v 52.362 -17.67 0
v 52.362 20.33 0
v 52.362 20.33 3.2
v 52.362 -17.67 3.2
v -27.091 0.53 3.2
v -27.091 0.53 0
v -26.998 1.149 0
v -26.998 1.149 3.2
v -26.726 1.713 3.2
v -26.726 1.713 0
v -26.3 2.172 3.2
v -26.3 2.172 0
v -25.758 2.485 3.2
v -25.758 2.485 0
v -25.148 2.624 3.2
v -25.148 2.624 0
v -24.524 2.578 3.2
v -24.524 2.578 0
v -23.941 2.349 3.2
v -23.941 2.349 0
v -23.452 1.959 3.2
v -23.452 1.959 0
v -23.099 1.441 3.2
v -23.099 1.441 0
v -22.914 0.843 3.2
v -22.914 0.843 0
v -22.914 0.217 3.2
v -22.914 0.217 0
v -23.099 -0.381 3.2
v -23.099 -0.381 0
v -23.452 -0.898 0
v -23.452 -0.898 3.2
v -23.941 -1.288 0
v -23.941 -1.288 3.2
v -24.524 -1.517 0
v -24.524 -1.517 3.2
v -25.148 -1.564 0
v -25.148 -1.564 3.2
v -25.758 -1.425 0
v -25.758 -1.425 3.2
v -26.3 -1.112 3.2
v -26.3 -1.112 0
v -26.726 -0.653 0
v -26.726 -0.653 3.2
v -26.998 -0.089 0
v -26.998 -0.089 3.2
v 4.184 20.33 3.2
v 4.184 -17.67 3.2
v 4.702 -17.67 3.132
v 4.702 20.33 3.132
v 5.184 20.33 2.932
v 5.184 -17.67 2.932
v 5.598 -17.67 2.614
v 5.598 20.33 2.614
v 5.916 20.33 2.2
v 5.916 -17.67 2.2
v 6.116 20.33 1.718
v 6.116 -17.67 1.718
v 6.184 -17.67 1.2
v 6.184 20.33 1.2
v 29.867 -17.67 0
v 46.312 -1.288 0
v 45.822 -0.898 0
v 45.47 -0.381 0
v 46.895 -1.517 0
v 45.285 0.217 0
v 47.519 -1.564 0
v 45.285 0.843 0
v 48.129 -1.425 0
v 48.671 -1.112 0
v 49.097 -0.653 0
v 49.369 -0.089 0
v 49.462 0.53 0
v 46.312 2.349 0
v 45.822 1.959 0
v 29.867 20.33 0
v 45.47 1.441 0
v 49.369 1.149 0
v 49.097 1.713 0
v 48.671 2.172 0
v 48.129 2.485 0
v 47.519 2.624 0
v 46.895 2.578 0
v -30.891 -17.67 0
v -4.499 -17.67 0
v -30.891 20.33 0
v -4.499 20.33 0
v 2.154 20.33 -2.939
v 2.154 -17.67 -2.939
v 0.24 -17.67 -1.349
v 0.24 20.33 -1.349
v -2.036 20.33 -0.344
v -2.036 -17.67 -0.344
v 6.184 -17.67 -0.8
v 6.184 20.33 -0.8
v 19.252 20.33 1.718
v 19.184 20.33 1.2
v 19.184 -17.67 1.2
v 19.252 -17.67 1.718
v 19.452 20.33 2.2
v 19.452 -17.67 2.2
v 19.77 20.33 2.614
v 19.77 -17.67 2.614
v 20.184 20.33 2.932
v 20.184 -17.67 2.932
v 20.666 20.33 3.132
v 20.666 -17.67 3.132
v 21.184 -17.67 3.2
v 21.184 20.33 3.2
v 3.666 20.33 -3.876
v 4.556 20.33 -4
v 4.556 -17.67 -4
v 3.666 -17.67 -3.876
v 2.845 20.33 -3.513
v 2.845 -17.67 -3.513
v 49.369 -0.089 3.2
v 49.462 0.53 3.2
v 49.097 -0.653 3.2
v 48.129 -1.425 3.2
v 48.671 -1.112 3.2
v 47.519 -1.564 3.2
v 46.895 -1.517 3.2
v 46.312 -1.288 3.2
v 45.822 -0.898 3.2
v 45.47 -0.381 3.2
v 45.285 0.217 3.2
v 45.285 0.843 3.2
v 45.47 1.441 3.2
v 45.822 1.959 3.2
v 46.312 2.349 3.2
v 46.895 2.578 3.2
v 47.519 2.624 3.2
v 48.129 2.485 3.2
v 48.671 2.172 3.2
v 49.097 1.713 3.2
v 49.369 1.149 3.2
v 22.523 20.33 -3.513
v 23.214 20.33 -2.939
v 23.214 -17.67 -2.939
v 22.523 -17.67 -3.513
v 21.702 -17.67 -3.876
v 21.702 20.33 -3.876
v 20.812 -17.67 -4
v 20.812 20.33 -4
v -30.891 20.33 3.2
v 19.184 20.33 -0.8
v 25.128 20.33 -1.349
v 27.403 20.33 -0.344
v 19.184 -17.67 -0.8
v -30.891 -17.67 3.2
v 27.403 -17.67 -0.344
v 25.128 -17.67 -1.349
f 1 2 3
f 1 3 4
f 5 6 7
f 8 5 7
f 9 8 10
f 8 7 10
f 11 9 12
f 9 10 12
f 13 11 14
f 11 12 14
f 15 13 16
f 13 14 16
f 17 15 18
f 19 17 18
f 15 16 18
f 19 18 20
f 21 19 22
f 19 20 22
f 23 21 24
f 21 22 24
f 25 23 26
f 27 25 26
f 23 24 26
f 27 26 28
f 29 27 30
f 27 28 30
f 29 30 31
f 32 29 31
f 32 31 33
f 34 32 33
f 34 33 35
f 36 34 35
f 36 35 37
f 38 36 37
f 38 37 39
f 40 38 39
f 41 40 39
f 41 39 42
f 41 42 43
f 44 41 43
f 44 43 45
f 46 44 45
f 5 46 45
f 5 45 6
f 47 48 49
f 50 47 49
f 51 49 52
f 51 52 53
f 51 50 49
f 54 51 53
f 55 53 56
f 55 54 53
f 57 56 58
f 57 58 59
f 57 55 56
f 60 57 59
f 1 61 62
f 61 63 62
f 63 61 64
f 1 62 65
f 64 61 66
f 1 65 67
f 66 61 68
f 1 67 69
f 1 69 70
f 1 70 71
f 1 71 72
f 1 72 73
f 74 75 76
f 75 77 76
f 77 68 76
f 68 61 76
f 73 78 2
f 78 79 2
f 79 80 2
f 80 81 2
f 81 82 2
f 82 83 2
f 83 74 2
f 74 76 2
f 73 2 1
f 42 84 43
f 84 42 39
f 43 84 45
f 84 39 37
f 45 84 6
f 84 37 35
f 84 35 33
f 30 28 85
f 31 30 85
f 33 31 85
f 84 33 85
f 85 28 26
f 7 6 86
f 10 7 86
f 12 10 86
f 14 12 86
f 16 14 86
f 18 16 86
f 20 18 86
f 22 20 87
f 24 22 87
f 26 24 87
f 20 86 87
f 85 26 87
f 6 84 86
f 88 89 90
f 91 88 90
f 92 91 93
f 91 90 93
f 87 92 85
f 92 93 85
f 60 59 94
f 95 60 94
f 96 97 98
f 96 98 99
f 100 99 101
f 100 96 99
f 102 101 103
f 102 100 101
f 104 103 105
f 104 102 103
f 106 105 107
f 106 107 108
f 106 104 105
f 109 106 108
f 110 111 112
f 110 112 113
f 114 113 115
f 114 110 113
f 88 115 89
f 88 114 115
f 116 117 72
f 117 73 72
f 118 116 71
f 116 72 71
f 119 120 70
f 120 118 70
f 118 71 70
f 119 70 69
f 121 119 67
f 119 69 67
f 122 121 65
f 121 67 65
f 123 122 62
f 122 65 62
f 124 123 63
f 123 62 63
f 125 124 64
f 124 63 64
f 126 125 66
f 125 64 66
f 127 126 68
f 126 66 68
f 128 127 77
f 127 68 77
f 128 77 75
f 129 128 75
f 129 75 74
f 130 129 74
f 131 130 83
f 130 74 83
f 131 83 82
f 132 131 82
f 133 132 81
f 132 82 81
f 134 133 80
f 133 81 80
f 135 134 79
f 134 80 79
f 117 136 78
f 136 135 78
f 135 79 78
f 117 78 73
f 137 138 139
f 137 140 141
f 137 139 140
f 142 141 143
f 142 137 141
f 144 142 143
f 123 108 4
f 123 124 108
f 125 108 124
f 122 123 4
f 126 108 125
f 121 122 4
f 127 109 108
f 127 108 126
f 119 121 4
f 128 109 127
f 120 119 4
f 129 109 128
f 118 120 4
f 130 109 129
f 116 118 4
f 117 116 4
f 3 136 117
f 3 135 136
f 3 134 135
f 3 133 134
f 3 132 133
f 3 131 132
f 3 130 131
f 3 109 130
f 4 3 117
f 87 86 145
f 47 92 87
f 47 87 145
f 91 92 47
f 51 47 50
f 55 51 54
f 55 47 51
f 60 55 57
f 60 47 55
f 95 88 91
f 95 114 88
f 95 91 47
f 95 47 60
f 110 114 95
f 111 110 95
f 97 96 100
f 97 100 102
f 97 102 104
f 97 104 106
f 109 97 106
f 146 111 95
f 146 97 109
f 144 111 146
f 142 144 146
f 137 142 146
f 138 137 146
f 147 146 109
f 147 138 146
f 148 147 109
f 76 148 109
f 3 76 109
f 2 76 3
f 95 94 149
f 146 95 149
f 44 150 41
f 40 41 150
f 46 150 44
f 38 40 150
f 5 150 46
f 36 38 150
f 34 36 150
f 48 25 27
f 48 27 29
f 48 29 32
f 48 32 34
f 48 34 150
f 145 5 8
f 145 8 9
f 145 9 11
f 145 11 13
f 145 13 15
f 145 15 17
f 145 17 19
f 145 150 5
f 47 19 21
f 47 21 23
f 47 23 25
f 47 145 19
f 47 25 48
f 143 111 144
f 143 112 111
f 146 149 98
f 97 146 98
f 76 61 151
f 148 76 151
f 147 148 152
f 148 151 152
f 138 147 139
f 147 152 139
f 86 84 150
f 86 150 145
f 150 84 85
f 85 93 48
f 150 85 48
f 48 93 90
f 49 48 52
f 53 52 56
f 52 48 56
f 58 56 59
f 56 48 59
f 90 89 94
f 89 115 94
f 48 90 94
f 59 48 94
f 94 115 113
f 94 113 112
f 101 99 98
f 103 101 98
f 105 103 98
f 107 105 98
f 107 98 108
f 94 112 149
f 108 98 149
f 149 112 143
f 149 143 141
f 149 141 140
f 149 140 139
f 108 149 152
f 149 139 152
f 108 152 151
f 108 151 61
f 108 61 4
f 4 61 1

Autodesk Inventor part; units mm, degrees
ref_plane "YZ Plane" through (0, 0, 0) normal (1, 0, 0) x (0, 1, 0)
ref_plane "XZ Plane" through (0, 0, 0) normal (0, 1, 0) x (-1, 0, 0)
ref_plane "XY Plane" through (0, 0, 0) normal (0, 0, 1) x (1, 0, 0)
sketch "Эскиз1" plane through (0, 0, 0) normal (0, 0, 1) x (1, 0, 0)
  line L0 (-52.8161, -17.6697) -> (52.3618, -17.6697)
  line L1 (-52.8161, 20.3303) -> (52.3618, 20.3303)
  line L2 (52.3618, 20.3303) -> (52.3618, -17.6697)
  line L3 (52.3618, -17.6697) -> (-52.8161, -17.6697)
  line L4 (-52.8161, -17.6697) -> (-52.8161, 20.3303)
  circle A0 centre (-47.8161, 0.5303) radius 2.1
  circle A1 centre (47.3618, 0.5303) radius 2.1
  point P0 (0, 0)
  point P1 (-8.6177, 20.3303)
extrude "Выдавливание1" add sketch "Эскиз1" along normal blind 3.2
sketch "Эскиз2" plane through (-52.8161, -17.6697, 0) normal (0, -1, 0) x (1, 0, 0)
  line L0 (105.1779, 3.2) -> (0, 3.2) projected
  line L1 (105.1779, 0) -> (0, 0) projected
  line L2 (72, 3.2) -> (59, 3.2)
  line L3 (59, 3.2) -> (59, 0)
  line L4 (59, 0) -> (72, 0)
  line L5 (72, 3.2) -> (59, 3.2)
  line L6 (59, 3.2) -> (59, -0.8)
  line L7 (59, -0.8) -> (72, -0.8)
  line L8 (72, -0.8) -> (72, 3.2)
  point P0 (52.8161, 0)
  dimension "d5" = 4
extrude "Выдавливание2" cut sketch "Эскиз2" against normal through all
fillet "Сопряжение1" radius 2 1 edges at (6.1839, 1.3303, 3.2)
sketch "Эскиз3" plane through (-52.8161, -17.6697, 0) normal (0, -1, 0) x (1, 0, 0)
  line L0 (105.1779, 3.2) -> (72, 3.2) projected
  line L1 (72, 3.2) -> (59, 3.2)
  line L2 (59, 3.2) -> (59, -0.8)
  line L3 (59, -0.8) -> (72, -0.8)
  line L4 (72, -0.8) -> (72, 3.2)
  line L5 (72, -0.8) -> (59, -0.8)
  line L6 (59, -0.8) -> (59, -4)
  line L7 (59, -4) -> (72, -4)
  line L8 (72, -4) -> (72, -0.8)
  line L9 (72, 0) -> (105.1779, 0) projected
  line L10 (72, -4) -> (75.2, -4)
  line L11 (75.2, -4) -> (75.2, 0)
  line L12 (75.2, 0) -> (72, 0)
  line L13 (72, 0) -> (72, -4)
  line L14 (59, -4) -> (55.8, -4)
  line L15 (55.8, -4) -> (55.8, 0)
  line L16 (55.8, 0) -> (59, 0)
  line L17 (59, 0) -> (59, -4)
  point P0 (52.8161, 0)
  dimension "d6" = 13
  dimension "d7" = 4
  dimension "d8" = 13
  dimension "d9" = 3.2
  dimension "d10" = 3.2
  dimension "d11" = 3.2
extrude "Выдавливание3" add sketch "Эскиз3" against normal up to surface (38 mm away) contours L9 L11 L10 L8 L4 | L2 L6 L14 L15 L16 | L8 L7 L6 L3
fillet "Сопряжение2" radius 2 1 edges at (19.1839, 1.3303, 3.2)
fillet "Сопряжение3" radius 9 2 edges at (22.3839, 1.3303, 0) (2.9839, 1.3303, 0)
fillet "Сопряжение4" radius 3.25 2 edges at (2.9839, 1.3303, -4) (22.3839, 1.3303, -4)
sketch "Эскиз4" plane through (0, 0, 0) normal (0, 0, -1) x (-1, 0, 0)
  line L0 (30.891, 20.3303) -> (19.391, 20.3303) projected
  line L1 (30.891, -17.6697) -> (30.891, 20.3303) projected
  line L2 (19.391, -17.6697) -> (30.891, -17.6697) projected
  line L3 (19.391, -17.6697) -> (19.391, 20.3303) projected
  circle A0 centre (24.991, 0.5303) radius 2.1 projected
  line L4 (4.4994, -17.6697) -> (4.4994, 20.3303) projected
  line L5 (52.8161, -17.6697) -> (4.4994, -17.6697) projected
  line L6 (52.8161, 20.3303) -> (52.8161, -17.6697) projected
  line L7 (4.4994, 20.3303) -> (52.8161, 20.3303) projected
  circle A1 centre (47.8161, 0.5303) radius 2.1 projected
  point P0 (0, 0)
extrude "Выдавливание4" cut sketch "Эскиз4" against normal blind 10 contours L7 L6 L5 L1 | A0
properties part number "драйвер 2"
